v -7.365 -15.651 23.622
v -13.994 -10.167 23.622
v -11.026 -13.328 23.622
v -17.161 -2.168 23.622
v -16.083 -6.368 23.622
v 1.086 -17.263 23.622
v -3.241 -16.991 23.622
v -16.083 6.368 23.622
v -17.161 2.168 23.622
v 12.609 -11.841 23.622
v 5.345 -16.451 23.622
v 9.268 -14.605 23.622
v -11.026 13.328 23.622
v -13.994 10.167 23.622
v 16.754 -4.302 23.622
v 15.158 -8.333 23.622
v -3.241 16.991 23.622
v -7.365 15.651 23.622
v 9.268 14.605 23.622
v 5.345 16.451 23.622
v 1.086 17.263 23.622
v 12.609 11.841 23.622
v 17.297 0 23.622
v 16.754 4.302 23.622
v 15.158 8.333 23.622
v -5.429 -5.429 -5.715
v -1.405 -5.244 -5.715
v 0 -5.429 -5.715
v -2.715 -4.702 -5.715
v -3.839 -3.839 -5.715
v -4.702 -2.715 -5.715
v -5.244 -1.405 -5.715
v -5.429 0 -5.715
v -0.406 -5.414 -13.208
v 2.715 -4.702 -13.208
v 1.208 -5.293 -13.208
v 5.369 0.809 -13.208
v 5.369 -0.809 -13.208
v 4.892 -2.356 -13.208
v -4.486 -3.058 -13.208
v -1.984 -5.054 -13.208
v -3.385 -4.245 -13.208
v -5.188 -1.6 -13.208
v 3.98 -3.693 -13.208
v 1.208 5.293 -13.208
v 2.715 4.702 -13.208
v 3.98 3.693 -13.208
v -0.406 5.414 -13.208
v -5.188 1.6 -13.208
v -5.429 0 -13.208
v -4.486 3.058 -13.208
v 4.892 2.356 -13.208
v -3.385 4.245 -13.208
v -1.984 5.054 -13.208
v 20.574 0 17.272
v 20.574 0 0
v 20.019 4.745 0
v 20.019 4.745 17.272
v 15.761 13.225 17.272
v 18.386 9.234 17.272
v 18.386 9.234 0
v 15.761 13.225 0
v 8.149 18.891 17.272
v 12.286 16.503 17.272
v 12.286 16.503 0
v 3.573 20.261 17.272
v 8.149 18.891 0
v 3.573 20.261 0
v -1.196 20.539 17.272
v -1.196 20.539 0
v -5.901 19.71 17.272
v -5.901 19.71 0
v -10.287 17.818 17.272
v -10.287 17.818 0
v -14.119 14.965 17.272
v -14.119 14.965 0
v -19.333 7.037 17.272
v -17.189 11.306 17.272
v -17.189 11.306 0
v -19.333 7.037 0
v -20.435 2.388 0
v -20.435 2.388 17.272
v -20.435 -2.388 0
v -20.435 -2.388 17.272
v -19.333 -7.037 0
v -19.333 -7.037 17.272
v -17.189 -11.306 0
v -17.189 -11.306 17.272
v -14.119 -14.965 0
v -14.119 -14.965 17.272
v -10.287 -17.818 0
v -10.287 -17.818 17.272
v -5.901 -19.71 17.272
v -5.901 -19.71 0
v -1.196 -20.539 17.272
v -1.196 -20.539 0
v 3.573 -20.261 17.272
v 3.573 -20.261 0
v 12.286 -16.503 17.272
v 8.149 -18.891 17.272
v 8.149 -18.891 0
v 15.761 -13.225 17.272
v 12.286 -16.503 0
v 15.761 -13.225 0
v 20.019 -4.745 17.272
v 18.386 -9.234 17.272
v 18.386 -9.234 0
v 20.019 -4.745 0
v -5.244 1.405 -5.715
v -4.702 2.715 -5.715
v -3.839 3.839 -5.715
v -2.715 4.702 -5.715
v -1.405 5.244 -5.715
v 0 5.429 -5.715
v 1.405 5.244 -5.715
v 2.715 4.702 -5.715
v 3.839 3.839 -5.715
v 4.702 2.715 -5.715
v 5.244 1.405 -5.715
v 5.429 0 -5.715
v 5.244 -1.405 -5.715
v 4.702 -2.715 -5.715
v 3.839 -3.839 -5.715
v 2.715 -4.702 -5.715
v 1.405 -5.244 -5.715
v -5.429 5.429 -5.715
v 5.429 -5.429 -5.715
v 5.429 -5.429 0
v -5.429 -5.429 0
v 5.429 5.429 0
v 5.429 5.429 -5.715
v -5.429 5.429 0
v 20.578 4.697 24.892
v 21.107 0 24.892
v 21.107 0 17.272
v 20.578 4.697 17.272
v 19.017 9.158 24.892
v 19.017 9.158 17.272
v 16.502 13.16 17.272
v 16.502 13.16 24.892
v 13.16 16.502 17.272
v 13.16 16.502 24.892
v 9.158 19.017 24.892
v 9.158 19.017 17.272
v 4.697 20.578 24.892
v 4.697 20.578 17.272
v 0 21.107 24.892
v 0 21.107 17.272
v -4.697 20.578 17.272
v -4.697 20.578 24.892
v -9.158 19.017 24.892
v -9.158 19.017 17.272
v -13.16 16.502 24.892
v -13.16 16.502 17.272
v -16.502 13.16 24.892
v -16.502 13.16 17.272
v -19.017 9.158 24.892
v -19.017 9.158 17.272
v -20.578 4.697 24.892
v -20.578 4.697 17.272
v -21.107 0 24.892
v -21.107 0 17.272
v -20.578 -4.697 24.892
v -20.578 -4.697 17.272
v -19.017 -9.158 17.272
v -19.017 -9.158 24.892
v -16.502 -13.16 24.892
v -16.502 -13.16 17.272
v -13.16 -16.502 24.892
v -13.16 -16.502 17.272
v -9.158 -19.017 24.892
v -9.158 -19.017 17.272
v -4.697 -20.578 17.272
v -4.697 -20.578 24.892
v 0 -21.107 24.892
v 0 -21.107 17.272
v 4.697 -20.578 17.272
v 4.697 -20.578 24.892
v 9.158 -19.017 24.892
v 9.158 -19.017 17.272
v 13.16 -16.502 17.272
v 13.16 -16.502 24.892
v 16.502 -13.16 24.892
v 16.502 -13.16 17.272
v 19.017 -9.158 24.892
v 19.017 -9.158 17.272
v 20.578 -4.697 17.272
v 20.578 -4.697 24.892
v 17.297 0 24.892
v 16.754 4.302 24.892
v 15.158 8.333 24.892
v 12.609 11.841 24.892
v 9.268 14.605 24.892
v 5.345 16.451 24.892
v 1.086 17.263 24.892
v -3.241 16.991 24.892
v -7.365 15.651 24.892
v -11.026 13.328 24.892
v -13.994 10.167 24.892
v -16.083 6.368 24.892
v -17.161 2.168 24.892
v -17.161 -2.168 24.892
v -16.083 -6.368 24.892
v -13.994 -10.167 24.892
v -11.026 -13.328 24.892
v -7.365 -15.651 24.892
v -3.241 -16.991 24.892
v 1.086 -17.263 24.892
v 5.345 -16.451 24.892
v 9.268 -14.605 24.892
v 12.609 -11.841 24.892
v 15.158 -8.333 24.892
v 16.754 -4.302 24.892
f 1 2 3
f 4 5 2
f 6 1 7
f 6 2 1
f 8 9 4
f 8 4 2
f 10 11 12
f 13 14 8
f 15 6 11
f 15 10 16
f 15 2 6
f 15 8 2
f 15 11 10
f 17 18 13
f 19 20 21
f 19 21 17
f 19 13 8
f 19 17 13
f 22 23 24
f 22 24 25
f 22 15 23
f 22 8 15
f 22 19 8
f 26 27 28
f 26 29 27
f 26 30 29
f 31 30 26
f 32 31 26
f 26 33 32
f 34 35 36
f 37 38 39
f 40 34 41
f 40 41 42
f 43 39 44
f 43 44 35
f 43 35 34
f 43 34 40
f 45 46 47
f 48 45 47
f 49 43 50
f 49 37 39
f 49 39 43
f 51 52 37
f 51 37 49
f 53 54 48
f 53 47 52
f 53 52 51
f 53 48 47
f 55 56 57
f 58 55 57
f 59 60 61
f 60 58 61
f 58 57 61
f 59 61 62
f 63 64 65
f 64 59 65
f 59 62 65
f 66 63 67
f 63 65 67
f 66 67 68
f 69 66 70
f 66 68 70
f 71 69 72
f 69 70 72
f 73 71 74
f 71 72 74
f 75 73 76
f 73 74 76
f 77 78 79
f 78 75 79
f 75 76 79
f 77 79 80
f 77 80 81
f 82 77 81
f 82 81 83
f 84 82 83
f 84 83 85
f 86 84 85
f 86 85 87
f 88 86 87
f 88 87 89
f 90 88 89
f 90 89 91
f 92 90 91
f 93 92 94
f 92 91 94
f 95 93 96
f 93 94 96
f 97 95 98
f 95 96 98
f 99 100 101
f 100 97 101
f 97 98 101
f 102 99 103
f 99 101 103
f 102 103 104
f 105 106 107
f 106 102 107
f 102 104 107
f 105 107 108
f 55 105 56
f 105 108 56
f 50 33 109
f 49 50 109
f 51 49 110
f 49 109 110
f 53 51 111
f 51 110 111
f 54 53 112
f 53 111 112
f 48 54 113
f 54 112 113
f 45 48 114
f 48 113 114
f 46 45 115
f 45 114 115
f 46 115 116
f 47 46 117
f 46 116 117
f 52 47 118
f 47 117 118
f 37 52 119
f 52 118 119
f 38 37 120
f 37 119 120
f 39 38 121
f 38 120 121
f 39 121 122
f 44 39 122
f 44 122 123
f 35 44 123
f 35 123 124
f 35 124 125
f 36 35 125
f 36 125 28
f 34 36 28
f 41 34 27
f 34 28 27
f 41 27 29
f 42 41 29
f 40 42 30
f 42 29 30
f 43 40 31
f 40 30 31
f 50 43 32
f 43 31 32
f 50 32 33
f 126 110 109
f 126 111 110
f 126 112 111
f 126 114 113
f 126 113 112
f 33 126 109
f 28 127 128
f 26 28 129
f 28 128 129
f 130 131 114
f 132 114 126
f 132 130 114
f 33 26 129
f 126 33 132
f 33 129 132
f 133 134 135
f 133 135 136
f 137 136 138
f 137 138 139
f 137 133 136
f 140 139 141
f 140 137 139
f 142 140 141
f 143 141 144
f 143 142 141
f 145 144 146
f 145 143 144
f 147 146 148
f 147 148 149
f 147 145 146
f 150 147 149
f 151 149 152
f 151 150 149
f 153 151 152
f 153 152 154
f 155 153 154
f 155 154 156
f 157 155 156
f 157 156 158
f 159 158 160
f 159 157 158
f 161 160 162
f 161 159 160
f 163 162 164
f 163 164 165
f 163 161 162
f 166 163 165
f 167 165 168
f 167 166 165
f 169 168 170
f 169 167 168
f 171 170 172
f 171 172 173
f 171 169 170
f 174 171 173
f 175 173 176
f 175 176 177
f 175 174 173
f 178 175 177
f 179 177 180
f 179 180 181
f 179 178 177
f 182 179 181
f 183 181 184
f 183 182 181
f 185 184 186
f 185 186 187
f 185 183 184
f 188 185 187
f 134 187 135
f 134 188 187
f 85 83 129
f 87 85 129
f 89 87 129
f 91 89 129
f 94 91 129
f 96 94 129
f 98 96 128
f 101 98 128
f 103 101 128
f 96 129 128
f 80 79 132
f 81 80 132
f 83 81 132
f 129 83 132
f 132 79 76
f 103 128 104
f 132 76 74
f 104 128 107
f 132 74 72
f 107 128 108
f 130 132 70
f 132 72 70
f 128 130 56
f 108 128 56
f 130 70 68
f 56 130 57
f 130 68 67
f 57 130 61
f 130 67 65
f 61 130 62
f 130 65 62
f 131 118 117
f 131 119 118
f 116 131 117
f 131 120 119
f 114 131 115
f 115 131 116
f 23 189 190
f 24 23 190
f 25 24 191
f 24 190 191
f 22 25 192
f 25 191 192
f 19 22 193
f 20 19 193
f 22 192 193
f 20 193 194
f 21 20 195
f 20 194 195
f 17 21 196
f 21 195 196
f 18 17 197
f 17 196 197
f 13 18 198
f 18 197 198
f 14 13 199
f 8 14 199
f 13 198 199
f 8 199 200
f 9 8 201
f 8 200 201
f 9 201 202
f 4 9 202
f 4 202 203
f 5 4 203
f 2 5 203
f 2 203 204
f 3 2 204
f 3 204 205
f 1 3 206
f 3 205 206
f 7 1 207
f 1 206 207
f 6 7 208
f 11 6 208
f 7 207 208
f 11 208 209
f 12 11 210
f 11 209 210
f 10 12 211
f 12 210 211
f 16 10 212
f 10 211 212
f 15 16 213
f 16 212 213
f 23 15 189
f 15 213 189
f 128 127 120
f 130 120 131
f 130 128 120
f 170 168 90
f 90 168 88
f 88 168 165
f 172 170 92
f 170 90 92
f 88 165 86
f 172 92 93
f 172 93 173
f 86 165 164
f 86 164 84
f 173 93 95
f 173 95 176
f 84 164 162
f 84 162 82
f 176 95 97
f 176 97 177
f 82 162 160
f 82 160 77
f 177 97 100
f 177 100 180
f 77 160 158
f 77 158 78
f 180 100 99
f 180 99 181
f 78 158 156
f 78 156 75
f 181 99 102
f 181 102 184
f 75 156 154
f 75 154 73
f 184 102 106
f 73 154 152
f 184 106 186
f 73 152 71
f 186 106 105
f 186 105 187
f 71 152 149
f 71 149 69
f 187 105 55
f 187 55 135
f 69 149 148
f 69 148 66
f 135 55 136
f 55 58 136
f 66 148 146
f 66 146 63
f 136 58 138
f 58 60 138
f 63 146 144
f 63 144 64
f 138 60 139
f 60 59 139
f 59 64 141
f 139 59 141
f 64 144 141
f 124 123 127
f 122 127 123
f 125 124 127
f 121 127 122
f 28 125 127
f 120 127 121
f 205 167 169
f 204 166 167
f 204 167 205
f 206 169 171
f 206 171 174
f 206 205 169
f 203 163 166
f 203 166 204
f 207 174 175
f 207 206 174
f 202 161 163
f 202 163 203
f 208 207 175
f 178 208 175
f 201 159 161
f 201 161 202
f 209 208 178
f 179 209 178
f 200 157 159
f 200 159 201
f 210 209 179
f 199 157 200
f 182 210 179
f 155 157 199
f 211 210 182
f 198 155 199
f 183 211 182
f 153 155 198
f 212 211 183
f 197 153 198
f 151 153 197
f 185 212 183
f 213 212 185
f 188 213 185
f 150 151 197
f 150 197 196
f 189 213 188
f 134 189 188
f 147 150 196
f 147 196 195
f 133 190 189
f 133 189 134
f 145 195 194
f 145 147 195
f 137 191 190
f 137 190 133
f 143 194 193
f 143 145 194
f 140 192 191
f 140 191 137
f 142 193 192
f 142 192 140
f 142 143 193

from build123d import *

# Parameters (mm, degrees)
SKETCH1_R           = 20.574
BOSS_EXTRUDE1_DEPTH = 24.892
SKETCH2_R           = 21.1074
BOSS_EXTRUDE2_DEPTH = 7.62
SKETCH3_R           = 17.2974
CUT_EXTRUDE1_DEPTH  = 1.27
SKETCH4_W           = 10.8585
SKETCH4_H           = 10.8585
BOSS_EXTRUDE3_DEPTH = 5.715
SKETCH5_R           = 5.42925
BOSS_EXTRUDE4_DEPTH = 7.493


with BuildPart() as part:
    # Sketch1 → Boss-Extrude1 (new body)
    with BuildSketch(Plane.XY):
        Circle(SKETCH1_R)
    extrude(amount=BOSS_EXTRUDE1_DEPTH)

    # Sketch2 → Boss-Extrude2 (add)
    with BuildSketch(Plane.XY.offset(24.892)):
        Circle(SKETCH2_R)
    extrude(amount=-BOSS_EXTRUDE2_DEPTH)

    # Sketch3 → Cut-Extrude1 (cut)
    with BuildSketch(Plane.XY.offset(24.892)):
        Circle(SKETCH3_R)
    extrude(amount=-CUT_EXTRUDE1_DEPTH, mode=Mode.SUBTRACT)

    # Sketch4 → Boss-Extrude3 (add)
    with BuildSketch(Plane(origin=(0, 0, 0), x_dir=(-1, 0, 0), z_dir=(0, 0, -1))):
        Rectangle(SKETCH4_W, SKETCH4_H)
    extrude(amount=BOSS_EXTRUDE3_DEPTH)

    # Sketch5 → Boss-Extrude4 (add)
    with BuildSketch(Plane(origin=(0, 0, -5.715), x_dir=(-1, 0, 0), z_dir=(0, 0, -1))):
        Circle(SKETCH5_R)
    extrude(amount=BOSS_EXTRUDE4_DEPTH)


solid = part.part
